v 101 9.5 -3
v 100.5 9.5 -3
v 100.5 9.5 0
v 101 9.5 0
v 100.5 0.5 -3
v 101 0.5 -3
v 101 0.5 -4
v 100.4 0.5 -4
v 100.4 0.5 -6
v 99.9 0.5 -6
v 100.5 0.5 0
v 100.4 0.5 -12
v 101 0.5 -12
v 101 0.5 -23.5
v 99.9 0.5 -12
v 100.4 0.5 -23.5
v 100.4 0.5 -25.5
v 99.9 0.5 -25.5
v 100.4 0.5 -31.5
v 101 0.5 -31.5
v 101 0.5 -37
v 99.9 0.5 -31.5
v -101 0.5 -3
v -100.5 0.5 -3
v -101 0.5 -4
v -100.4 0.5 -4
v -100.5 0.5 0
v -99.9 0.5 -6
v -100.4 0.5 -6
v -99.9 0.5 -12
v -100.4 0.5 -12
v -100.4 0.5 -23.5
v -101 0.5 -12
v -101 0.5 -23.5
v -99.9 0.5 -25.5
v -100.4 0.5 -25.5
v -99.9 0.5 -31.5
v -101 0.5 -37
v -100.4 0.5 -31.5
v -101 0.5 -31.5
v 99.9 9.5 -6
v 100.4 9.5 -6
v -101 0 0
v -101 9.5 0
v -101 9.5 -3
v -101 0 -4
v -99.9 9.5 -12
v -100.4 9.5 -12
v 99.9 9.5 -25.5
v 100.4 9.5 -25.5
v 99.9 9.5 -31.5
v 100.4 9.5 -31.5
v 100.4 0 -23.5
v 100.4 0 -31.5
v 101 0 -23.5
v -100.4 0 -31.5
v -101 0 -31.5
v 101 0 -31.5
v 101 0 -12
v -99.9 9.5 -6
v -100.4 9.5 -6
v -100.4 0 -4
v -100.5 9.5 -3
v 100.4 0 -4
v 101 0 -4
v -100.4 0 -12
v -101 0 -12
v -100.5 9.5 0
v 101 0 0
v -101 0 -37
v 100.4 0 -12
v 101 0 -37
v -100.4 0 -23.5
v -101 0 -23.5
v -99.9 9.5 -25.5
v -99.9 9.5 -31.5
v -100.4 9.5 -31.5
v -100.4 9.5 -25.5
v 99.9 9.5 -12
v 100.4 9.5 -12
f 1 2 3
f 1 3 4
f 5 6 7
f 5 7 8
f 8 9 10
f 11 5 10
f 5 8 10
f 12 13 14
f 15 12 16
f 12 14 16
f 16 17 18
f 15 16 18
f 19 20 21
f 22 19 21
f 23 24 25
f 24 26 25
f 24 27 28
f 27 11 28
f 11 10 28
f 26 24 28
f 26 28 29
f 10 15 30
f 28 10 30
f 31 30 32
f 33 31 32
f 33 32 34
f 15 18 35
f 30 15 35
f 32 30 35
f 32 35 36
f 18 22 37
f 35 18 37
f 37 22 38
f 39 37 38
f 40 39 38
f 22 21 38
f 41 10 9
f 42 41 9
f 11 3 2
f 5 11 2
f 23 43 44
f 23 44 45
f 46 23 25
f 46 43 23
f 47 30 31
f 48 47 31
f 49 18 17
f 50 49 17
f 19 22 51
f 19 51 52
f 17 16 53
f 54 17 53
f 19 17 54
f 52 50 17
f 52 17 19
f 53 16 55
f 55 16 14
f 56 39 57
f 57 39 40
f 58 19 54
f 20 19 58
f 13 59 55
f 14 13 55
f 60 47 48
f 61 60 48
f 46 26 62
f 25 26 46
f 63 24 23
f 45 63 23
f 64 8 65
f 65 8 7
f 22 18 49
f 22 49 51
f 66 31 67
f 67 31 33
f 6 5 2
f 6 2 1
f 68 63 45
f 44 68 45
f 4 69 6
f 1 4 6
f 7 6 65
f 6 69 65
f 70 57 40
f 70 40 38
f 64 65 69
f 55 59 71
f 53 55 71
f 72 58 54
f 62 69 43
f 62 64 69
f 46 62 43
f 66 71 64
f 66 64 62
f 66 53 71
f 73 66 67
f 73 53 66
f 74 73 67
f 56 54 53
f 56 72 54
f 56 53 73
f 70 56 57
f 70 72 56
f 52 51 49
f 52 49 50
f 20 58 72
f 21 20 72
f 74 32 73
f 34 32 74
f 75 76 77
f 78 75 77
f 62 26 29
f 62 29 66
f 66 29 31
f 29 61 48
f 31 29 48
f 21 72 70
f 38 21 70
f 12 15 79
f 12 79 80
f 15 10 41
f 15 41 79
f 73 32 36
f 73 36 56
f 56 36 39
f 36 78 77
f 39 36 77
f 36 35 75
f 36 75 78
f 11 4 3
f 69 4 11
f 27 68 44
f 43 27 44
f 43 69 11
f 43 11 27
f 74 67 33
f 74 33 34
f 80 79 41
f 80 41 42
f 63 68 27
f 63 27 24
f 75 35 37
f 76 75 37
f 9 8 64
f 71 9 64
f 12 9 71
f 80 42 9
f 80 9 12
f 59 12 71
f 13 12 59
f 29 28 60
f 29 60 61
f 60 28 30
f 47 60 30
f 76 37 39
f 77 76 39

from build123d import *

# Parameters (mm, degrees)
SKETCH1_W                      = 101
SKETCH1_H                      = 37
BOSS_MAINBRIDGERIGHTHALF_DEPTH = 0.5
SKETCH2_W                      = 0.5
SKETCH2_H                      = 3
SKETCH2_H_2                    = 6
BOSS_METALTABS_DEPTH           = 9
SKETCH3_W                      = 0.6
SKETCH3_H                      = 8
CUT_EXTRUDE1_DEPTH             = 1.5


with BuildPart() as part:
    # Sketch1 → Boss-MainBridgeRightHalf (new body)
    with BuildSketch(Plane(origin=(0, 0, 0), x_dir=(1, 0, 0), z_dir=(0, 1, 0))):
        with Locations((50.5, 18.5)):
            Rectangle(SKETCH1_W, SKETCH1_H)
    boss_mainbridgerighthalf = extrude(amount=BOSS_MAINBRIDGERIGHTHALF_DEPTH)

    # Sketch2 → Boss-MetalTabs (add)
    with BuildSketch(Plane(origin=(0, 0.5, 0), x_dir=(1, 0, 0), z_dir=(0, 1, 0))):
        with Locations((100.75, 1.5)):
            Rectangle(SKETCH2_W, SKETCH2_H)
        with Locations((100.15, 28.5)):
            Rectangle(SKETCH2_W, SKETCH2_H_2)
        with Locations((100.15, 9)):
            Rectangle(SKETCH2_W, SKETCH2_H_2)
    boss_metaltabs = extrude(amount=BOSS_METALTABS_DEPTH)

    # Sketch3 → Cut-Extrude1 (cut, through all)
    with BuildSketch(Plane(origin=(0, 0.5, 0), x_dir=(1, 0, 0), z_dir=(0, 1, 0))):
        with Locations((100.7, 27.5)):
            Rectangle(SKETCH3_W, SKETCH3_H)
        with Locations((100.7, 8)):
            Rectangle(SKETCH3_W, SKETCH3_H)
    cut_extrude1 = extrude(amount=-CUT_EXTRUDE1_DEPTH, mode=Mode.SUBTRACT)

    # Mirror1: Boss-MainBridgeRightHalf, Boss-MetalTabs, Cut-Extrude1 across plane
    add(boss_mainbridgerighthalf.mirror(Plane(origin=(0, 0.5, 0), x_dir=(0, 0, 1), z_dir=(1, 0, 0))))
    add(boss_metaltabs.mirror(Plane(origin=(0, 0.5, 0), x_dir=(0, 0, 1), z_dir=(1, 0, 0))))
    add(cut_extrude1.mirror(Plane(origin=(0, 0.5, 0), x_dir=(0, 0, 1), z_dir=(1, 0, 0))), mode=Mode.SUBTRACT)


solid = part.part
